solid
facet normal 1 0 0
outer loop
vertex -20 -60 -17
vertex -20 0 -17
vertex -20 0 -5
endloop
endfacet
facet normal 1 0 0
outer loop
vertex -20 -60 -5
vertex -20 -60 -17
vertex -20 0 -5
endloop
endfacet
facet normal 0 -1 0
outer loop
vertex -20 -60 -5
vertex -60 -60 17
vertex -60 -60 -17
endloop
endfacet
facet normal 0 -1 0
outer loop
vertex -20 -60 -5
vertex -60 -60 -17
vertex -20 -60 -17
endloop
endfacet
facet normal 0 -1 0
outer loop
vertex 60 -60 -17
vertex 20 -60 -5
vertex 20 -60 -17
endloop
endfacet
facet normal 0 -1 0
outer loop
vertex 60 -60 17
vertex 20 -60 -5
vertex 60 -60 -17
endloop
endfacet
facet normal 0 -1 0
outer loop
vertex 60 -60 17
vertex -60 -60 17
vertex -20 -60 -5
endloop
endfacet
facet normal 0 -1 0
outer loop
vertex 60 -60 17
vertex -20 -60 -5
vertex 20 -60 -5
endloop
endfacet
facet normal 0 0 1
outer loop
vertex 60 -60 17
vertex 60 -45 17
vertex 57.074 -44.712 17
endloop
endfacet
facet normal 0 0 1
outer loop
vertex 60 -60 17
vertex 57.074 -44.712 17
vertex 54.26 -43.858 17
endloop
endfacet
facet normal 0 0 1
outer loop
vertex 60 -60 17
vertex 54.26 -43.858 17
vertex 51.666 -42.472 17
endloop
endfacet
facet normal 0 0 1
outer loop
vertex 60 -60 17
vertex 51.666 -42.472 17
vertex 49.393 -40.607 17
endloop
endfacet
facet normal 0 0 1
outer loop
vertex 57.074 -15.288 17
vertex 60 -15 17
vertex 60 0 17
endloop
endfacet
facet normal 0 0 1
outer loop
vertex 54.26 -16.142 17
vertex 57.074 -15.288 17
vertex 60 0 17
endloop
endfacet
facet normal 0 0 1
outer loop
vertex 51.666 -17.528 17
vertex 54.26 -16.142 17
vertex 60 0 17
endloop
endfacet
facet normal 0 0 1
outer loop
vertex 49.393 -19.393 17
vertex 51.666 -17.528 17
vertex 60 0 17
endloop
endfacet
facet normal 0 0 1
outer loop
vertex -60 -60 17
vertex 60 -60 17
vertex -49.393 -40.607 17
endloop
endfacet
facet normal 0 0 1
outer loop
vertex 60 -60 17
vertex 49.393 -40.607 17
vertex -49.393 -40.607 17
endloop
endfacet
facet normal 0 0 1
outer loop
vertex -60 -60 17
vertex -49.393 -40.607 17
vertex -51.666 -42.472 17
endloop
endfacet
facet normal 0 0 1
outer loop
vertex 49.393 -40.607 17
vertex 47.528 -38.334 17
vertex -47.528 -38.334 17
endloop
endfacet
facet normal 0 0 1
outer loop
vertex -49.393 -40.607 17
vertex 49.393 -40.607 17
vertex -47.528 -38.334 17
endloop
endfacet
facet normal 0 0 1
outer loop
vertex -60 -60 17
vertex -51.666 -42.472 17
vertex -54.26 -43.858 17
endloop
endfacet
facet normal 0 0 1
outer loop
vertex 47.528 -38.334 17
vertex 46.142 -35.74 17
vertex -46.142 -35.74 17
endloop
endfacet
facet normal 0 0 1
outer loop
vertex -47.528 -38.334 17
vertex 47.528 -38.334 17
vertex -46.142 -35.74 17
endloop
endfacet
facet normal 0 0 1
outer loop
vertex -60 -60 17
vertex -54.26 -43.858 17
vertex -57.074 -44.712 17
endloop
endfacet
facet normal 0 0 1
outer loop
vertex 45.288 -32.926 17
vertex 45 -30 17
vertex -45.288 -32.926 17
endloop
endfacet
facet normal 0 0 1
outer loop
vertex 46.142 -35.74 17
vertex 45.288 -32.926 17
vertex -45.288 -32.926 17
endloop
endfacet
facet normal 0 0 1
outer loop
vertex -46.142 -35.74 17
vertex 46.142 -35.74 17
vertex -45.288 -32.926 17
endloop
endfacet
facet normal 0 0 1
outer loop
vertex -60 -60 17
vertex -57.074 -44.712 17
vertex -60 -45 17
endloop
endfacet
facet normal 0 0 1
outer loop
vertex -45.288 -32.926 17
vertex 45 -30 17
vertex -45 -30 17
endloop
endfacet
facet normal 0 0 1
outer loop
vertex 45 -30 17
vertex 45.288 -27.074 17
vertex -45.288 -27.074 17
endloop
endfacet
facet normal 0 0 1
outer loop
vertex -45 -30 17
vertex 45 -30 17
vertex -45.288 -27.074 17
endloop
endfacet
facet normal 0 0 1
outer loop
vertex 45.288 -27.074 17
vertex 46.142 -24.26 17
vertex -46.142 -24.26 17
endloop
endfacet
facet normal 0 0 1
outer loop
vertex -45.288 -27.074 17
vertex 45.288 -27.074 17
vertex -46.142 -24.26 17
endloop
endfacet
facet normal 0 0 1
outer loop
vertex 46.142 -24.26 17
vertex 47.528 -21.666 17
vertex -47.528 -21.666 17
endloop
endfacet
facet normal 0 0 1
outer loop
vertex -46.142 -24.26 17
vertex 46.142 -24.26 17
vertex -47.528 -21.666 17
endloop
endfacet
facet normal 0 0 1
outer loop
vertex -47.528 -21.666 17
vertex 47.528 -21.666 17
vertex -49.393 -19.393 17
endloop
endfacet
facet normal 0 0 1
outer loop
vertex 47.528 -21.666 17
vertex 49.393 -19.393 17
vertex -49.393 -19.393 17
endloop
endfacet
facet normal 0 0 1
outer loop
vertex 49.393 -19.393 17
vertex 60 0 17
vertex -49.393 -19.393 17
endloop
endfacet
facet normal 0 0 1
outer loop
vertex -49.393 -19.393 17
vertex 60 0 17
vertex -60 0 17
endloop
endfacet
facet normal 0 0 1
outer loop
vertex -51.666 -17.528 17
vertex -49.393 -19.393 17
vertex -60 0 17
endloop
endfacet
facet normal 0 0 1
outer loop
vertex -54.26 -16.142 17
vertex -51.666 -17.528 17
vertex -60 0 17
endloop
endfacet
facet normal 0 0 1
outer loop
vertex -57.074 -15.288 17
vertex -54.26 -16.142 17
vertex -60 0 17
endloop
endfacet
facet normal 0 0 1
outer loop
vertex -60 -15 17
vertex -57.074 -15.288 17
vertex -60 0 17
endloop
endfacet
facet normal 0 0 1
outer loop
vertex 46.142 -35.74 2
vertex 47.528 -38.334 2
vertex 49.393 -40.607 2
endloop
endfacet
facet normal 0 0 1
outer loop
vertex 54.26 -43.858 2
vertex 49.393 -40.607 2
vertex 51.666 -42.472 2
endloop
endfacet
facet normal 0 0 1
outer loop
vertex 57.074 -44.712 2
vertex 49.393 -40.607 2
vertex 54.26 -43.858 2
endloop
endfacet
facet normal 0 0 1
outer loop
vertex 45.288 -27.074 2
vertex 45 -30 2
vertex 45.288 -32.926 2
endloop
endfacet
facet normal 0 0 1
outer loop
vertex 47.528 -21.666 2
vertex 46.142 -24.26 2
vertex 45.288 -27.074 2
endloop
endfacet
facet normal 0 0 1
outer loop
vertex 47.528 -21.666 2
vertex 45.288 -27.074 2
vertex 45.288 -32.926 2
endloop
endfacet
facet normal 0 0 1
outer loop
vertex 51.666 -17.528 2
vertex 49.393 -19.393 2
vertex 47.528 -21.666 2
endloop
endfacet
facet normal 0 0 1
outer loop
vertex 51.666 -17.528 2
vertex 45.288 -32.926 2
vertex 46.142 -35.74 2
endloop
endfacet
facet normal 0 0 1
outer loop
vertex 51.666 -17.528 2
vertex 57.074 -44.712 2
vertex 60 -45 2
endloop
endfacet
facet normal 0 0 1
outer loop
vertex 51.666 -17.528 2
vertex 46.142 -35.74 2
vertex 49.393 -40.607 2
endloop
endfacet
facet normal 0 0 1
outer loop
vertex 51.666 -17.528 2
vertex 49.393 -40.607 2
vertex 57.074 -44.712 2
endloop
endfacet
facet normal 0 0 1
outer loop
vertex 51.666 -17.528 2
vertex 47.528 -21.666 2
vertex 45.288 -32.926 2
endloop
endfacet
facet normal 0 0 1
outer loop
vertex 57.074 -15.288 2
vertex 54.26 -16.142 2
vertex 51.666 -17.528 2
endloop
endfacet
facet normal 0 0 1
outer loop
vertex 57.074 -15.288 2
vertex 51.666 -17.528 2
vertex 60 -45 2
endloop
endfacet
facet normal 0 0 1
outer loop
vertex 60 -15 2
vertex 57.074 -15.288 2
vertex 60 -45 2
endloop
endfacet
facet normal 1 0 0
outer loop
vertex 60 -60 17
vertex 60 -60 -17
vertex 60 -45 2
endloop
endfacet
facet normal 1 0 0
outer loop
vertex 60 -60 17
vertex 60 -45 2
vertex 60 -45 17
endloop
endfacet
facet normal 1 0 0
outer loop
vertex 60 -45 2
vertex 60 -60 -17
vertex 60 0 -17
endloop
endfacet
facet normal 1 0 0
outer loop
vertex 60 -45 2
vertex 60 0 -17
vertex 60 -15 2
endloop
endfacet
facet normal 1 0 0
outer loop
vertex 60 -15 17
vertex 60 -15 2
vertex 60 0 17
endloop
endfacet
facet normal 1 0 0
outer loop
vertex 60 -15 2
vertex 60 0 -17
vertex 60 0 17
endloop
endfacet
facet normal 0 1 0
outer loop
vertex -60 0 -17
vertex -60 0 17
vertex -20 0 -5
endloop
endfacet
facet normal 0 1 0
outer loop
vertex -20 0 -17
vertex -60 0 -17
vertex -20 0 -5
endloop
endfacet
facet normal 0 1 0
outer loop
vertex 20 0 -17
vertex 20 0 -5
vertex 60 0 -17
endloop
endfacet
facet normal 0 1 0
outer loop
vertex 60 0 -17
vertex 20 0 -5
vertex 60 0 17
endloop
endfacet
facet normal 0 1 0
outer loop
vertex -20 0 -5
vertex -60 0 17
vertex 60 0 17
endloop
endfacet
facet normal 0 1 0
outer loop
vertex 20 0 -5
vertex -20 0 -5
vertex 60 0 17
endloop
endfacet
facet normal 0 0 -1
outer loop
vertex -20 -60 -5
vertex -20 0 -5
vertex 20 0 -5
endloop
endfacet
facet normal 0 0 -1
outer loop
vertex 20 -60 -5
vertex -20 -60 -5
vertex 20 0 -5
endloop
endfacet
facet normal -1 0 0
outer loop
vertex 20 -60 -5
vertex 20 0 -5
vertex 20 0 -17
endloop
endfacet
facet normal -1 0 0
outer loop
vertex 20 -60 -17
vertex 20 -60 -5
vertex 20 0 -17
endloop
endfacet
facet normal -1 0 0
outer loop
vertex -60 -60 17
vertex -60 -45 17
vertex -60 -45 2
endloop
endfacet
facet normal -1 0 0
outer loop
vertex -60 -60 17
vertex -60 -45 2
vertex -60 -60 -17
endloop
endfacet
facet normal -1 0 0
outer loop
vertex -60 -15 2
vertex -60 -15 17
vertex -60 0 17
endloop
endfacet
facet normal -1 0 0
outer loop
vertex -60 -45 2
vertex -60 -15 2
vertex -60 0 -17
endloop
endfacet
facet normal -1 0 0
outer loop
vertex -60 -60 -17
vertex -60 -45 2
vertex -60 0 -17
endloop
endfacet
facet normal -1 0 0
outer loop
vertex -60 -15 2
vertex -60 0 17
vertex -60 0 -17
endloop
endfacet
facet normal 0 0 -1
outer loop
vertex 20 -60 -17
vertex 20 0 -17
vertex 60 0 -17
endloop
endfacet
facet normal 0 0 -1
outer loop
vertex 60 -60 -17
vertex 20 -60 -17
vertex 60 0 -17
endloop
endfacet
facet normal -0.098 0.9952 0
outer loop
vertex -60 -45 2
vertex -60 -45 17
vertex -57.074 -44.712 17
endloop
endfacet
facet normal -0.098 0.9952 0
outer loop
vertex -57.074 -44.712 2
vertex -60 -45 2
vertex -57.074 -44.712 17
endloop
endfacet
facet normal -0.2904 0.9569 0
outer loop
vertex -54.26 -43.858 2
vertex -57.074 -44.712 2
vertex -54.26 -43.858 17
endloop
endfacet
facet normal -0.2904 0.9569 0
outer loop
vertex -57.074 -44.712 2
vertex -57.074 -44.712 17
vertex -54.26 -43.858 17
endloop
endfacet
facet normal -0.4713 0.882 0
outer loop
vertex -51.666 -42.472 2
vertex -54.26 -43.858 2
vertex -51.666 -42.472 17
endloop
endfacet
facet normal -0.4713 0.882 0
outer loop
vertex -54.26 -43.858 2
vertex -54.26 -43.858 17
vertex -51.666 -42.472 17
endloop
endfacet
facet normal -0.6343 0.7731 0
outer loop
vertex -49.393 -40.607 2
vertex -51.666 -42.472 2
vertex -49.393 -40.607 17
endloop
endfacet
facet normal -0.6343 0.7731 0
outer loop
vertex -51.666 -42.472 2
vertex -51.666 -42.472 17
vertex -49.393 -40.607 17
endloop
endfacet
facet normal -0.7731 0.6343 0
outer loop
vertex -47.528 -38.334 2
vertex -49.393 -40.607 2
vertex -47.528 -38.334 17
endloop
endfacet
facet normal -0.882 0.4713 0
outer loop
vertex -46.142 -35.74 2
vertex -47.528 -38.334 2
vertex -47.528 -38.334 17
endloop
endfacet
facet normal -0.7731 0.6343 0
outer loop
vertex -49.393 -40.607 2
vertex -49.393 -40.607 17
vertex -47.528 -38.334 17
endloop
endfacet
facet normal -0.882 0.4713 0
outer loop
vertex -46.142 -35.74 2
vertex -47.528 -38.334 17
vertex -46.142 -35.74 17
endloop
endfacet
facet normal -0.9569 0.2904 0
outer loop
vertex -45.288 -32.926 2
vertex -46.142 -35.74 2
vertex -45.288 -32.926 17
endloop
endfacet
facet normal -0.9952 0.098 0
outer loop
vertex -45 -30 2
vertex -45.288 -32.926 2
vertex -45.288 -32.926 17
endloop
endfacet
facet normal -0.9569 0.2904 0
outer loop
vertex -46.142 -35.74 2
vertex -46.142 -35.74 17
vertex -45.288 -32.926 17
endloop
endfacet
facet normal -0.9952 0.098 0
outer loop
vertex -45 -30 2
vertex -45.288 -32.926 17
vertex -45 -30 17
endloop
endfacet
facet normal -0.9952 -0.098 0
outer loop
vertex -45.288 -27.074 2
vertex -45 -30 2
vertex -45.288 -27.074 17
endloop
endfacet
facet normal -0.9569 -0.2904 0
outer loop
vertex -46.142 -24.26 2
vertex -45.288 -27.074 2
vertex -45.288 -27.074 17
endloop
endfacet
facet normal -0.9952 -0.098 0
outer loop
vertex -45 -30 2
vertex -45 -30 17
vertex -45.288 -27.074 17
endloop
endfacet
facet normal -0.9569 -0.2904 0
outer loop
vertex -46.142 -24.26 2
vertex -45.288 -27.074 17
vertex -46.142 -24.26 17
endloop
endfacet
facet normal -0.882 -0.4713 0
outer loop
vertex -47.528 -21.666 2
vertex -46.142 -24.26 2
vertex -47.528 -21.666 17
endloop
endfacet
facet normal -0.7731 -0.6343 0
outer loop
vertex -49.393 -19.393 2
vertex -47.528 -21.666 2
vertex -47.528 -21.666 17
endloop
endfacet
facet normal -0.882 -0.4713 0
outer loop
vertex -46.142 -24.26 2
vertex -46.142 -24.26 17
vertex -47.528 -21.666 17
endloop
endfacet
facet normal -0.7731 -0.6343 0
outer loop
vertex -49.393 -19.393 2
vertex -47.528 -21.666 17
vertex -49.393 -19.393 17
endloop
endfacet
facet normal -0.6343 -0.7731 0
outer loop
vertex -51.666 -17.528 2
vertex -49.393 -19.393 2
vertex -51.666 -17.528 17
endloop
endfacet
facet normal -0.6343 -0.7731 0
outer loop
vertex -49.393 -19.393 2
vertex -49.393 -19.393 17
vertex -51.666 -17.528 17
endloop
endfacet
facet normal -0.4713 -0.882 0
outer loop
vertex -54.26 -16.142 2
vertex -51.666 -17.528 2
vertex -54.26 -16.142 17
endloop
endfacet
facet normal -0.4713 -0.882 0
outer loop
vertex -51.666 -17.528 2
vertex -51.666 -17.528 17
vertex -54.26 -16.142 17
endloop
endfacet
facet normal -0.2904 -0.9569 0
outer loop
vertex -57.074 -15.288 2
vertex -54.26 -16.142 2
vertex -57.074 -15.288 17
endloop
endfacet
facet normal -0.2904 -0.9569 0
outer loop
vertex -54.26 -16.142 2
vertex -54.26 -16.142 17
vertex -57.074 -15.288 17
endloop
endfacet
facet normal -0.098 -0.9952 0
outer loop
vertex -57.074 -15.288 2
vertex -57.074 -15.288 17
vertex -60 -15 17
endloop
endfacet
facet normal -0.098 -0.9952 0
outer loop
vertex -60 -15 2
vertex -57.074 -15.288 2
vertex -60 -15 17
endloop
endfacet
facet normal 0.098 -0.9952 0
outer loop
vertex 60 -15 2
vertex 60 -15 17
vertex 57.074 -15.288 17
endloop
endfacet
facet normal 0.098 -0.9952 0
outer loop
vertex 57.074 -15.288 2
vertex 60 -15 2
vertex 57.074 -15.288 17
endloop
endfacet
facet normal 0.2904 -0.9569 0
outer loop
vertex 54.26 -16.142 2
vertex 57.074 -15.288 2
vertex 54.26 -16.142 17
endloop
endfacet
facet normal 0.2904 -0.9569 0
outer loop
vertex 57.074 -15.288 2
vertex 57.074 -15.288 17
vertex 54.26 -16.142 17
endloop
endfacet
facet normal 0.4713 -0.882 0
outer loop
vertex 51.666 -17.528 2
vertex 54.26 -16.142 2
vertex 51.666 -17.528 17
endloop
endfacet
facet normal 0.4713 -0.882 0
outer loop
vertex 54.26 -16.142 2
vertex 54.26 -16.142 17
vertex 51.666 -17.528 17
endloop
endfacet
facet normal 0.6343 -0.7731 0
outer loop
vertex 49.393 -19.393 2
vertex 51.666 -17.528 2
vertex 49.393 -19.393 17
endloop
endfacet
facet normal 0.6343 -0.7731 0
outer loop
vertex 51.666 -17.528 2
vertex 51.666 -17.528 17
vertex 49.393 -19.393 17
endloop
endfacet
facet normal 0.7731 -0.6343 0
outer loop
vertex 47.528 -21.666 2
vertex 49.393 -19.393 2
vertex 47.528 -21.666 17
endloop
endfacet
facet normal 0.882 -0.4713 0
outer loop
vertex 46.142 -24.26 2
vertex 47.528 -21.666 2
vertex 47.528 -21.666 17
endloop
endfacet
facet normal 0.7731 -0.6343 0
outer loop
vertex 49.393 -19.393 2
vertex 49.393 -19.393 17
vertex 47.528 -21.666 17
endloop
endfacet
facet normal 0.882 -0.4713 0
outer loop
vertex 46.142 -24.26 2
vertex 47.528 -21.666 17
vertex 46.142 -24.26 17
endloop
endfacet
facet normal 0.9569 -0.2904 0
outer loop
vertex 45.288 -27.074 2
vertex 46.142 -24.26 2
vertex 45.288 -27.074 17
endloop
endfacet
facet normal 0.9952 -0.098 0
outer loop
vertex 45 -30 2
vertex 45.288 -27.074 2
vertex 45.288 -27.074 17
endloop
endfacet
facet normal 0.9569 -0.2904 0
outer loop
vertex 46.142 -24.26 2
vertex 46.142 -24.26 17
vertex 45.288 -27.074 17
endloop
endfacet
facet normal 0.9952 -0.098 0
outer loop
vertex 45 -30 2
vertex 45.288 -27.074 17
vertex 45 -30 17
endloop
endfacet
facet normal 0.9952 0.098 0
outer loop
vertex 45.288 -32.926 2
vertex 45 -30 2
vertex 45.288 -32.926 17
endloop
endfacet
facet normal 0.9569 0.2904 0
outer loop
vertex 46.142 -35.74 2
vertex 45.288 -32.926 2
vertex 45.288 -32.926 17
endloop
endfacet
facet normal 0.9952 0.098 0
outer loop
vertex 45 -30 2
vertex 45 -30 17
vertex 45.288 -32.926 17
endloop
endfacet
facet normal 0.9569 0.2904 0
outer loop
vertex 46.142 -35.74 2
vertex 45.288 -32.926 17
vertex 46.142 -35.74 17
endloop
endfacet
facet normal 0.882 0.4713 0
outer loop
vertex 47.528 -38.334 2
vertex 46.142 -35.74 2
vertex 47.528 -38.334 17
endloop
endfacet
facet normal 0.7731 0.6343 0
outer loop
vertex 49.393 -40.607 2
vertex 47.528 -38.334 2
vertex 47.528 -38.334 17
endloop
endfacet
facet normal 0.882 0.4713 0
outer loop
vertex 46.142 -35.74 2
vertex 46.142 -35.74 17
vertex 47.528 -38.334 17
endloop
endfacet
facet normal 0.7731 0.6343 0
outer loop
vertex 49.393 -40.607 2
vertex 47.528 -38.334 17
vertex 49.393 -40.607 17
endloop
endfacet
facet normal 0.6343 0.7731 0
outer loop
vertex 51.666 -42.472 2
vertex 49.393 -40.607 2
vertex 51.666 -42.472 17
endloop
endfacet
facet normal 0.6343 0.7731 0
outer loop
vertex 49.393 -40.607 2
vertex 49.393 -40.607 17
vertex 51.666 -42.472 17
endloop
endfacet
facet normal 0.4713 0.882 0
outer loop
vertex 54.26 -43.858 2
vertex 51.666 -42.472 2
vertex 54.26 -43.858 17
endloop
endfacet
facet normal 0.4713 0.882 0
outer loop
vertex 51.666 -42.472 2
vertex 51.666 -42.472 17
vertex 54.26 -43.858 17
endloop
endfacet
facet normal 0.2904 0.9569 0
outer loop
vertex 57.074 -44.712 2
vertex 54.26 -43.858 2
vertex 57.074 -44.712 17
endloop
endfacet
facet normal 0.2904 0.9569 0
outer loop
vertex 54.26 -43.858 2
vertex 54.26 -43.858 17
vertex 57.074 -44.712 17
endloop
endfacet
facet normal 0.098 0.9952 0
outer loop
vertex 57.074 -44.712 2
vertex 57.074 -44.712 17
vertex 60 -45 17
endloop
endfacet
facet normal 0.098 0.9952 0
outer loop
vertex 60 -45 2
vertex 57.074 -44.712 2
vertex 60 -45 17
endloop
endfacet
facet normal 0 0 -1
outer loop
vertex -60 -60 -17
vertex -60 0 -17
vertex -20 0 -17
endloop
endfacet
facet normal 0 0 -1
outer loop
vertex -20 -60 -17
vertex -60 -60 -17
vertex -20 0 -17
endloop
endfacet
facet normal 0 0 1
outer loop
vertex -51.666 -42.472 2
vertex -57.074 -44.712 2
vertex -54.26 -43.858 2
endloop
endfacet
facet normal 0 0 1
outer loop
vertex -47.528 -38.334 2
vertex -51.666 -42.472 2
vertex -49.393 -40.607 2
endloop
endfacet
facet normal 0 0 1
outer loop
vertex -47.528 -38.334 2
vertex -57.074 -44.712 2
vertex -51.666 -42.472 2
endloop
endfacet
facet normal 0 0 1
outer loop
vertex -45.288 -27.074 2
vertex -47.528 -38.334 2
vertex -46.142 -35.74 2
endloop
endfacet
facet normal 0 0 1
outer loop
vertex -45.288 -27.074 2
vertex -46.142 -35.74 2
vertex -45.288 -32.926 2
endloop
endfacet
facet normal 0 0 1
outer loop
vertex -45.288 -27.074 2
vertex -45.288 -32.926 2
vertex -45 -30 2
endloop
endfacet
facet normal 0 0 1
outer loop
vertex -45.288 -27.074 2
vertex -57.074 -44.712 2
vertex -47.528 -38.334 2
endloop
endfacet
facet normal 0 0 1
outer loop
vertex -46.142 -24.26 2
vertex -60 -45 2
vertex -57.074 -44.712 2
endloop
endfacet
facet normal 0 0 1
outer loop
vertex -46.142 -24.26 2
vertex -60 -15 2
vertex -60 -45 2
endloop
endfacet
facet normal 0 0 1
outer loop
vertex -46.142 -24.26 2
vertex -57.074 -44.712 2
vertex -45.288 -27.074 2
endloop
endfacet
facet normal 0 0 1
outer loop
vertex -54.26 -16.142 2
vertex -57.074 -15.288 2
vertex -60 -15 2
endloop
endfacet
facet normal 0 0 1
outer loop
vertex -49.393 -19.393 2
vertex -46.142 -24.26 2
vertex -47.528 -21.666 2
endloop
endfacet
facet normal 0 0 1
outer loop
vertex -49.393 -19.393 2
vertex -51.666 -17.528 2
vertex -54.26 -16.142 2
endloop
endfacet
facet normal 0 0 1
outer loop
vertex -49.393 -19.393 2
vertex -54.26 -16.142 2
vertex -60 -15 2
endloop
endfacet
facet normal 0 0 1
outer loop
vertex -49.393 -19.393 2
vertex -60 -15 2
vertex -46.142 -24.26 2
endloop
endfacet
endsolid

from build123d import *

# Parameters (mm, degrees)
F1_DEPTH = 60
F3_DEPTH = 15


with BuildPart() as f1:
    # F0 (on Front) → F1 (new body)
    with BuildSketch(Plane.XZ):
        Polygon((60, 17), (-60, 17), (-60, -17), (-20, -17), (-20, -5), (20, -5), (20, -17), (60, -17), align=None)
    extrude(amount=F1_DEPTH)

    # F2 (on face) → F3 (cut)
    with BuildSketch(Plane.XY.offset(17)):
        with BuildLine():
            ThreePointArc((-60, -45), (-45, -30), (-60, -15))
            Line((-60, -15), (-60, -45))
        make_face()
        with BuildLine():
            Line((60, -45), (60, -15))
            ThreePointArc((60, -15), (45, -30), (60, -45))
        make_face()
    extrude(amount=-F3_DEPTH, mode=Mode.SUBTRACT)


solid = f1.part
